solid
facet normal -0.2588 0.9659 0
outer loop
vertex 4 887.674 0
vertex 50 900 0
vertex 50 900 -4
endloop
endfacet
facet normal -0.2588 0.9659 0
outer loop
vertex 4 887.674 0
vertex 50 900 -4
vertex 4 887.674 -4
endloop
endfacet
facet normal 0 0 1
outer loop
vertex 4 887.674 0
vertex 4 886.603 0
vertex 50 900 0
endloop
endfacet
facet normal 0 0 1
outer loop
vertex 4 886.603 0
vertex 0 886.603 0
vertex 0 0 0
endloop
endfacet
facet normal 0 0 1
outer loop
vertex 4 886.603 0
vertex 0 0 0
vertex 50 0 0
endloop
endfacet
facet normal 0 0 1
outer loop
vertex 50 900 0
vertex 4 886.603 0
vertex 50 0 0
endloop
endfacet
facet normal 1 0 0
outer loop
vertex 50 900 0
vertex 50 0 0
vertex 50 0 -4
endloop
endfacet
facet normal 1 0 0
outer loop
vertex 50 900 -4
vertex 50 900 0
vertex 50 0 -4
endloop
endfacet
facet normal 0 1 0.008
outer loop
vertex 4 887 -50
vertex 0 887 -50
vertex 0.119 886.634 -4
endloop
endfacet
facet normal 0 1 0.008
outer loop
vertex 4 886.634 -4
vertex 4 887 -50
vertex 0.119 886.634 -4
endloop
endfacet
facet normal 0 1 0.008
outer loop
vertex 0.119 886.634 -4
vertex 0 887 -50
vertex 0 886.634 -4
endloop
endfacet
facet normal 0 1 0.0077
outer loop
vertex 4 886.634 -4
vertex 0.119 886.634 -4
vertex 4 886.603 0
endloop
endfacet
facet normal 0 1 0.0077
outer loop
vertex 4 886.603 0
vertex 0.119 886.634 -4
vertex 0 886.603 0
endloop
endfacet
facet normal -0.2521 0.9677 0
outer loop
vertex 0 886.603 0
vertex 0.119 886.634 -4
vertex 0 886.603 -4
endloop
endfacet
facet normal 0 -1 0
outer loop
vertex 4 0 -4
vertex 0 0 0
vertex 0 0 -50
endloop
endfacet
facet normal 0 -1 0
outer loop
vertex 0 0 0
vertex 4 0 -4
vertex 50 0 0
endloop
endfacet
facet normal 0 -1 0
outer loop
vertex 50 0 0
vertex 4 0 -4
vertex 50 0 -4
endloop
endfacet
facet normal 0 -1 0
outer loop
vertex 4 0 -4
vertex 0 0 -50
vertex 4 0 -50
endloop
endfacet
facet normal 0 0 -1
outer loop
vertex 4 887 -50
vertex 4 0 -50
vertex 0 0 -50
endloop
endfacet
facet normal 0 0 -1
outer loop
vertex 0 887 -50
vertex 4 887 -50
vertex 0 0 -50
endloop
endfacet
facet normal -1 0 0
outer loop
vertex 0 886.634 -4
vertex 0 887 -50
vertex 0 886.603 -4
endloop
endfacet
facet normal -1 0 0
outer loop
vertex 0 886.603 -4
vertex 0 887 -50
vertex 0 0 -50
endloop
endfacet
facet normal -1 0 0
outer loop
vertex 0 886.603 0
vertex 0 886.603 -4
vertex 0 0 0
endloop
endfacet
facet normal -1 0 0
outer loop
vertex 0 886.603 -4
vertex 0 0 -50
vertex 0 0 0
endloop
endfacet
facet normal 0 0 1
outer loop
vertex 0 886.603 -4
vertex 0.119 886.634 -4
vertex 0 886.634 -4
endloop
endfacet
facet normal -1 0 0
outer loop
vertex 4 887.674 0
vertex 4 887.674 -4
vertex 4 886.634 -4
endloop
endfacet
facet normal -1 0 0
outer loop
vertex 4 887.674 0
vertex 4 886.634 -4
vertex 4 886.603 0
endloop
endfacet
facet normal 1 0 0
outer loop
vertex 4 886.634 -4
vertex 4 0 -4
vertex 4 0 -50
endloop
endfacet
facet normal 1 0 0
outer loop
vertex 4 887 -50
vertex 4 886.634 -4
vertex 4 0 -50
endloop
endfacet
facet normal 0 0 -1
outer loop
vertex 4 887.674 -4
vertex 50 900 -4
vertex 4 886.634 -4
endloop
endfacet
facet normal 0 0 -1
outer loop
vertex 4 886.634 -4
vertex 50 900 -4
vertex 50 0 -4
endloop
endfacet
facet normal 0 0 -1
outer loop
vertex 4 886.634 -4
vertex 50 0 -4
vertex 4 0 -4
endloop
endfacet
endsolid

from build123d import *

# Parameters (mm, degrees)
EXTRUDE_1_DEPTH     = 900
CUT_EXTRUDE_1_DEPTH = 4
CUT_EXTRUDE_2_DEPTH = 4


with BuildPart() as part:
    # Эскиз1 → Вытянуть-Тонкостенный1 (new body)
    with BuildSketch(Plane(origin=(0, 0, 0), x_dir=(1, 0, 0), z_dir=(0, 1, 0))):
        Polygon((0, 50), (0, 0), (50, 0), (50, 4), (4, 4), (4, 50), align=None)
    extrude(amount=EXTRUDE_1_DEPTH)

    # Эскиз3 → Вырез-Вытянуть1 (cut)
    with BuildSketch(Plane.XY):
        Polygon((0, 900), (50, 900), (0, 886.602540378), align=None)
    extrude(amount=-CUT_EXTRUDE_1_DEPTH, mode=Mode.SUBTRACT)

    # Эскиз4 → Вырез-Вытянуть2 (cut)
    with BuildSketch(Plane.ZY):
        Polygon((0, 900), (-50, 900), (-50, 887), (0, 886.602540378), align=None)
    extrude(amount=-CUT_EXTRUDE_2_DEPTH, mode=Mode.SUBTRACT)


solid = part.part
